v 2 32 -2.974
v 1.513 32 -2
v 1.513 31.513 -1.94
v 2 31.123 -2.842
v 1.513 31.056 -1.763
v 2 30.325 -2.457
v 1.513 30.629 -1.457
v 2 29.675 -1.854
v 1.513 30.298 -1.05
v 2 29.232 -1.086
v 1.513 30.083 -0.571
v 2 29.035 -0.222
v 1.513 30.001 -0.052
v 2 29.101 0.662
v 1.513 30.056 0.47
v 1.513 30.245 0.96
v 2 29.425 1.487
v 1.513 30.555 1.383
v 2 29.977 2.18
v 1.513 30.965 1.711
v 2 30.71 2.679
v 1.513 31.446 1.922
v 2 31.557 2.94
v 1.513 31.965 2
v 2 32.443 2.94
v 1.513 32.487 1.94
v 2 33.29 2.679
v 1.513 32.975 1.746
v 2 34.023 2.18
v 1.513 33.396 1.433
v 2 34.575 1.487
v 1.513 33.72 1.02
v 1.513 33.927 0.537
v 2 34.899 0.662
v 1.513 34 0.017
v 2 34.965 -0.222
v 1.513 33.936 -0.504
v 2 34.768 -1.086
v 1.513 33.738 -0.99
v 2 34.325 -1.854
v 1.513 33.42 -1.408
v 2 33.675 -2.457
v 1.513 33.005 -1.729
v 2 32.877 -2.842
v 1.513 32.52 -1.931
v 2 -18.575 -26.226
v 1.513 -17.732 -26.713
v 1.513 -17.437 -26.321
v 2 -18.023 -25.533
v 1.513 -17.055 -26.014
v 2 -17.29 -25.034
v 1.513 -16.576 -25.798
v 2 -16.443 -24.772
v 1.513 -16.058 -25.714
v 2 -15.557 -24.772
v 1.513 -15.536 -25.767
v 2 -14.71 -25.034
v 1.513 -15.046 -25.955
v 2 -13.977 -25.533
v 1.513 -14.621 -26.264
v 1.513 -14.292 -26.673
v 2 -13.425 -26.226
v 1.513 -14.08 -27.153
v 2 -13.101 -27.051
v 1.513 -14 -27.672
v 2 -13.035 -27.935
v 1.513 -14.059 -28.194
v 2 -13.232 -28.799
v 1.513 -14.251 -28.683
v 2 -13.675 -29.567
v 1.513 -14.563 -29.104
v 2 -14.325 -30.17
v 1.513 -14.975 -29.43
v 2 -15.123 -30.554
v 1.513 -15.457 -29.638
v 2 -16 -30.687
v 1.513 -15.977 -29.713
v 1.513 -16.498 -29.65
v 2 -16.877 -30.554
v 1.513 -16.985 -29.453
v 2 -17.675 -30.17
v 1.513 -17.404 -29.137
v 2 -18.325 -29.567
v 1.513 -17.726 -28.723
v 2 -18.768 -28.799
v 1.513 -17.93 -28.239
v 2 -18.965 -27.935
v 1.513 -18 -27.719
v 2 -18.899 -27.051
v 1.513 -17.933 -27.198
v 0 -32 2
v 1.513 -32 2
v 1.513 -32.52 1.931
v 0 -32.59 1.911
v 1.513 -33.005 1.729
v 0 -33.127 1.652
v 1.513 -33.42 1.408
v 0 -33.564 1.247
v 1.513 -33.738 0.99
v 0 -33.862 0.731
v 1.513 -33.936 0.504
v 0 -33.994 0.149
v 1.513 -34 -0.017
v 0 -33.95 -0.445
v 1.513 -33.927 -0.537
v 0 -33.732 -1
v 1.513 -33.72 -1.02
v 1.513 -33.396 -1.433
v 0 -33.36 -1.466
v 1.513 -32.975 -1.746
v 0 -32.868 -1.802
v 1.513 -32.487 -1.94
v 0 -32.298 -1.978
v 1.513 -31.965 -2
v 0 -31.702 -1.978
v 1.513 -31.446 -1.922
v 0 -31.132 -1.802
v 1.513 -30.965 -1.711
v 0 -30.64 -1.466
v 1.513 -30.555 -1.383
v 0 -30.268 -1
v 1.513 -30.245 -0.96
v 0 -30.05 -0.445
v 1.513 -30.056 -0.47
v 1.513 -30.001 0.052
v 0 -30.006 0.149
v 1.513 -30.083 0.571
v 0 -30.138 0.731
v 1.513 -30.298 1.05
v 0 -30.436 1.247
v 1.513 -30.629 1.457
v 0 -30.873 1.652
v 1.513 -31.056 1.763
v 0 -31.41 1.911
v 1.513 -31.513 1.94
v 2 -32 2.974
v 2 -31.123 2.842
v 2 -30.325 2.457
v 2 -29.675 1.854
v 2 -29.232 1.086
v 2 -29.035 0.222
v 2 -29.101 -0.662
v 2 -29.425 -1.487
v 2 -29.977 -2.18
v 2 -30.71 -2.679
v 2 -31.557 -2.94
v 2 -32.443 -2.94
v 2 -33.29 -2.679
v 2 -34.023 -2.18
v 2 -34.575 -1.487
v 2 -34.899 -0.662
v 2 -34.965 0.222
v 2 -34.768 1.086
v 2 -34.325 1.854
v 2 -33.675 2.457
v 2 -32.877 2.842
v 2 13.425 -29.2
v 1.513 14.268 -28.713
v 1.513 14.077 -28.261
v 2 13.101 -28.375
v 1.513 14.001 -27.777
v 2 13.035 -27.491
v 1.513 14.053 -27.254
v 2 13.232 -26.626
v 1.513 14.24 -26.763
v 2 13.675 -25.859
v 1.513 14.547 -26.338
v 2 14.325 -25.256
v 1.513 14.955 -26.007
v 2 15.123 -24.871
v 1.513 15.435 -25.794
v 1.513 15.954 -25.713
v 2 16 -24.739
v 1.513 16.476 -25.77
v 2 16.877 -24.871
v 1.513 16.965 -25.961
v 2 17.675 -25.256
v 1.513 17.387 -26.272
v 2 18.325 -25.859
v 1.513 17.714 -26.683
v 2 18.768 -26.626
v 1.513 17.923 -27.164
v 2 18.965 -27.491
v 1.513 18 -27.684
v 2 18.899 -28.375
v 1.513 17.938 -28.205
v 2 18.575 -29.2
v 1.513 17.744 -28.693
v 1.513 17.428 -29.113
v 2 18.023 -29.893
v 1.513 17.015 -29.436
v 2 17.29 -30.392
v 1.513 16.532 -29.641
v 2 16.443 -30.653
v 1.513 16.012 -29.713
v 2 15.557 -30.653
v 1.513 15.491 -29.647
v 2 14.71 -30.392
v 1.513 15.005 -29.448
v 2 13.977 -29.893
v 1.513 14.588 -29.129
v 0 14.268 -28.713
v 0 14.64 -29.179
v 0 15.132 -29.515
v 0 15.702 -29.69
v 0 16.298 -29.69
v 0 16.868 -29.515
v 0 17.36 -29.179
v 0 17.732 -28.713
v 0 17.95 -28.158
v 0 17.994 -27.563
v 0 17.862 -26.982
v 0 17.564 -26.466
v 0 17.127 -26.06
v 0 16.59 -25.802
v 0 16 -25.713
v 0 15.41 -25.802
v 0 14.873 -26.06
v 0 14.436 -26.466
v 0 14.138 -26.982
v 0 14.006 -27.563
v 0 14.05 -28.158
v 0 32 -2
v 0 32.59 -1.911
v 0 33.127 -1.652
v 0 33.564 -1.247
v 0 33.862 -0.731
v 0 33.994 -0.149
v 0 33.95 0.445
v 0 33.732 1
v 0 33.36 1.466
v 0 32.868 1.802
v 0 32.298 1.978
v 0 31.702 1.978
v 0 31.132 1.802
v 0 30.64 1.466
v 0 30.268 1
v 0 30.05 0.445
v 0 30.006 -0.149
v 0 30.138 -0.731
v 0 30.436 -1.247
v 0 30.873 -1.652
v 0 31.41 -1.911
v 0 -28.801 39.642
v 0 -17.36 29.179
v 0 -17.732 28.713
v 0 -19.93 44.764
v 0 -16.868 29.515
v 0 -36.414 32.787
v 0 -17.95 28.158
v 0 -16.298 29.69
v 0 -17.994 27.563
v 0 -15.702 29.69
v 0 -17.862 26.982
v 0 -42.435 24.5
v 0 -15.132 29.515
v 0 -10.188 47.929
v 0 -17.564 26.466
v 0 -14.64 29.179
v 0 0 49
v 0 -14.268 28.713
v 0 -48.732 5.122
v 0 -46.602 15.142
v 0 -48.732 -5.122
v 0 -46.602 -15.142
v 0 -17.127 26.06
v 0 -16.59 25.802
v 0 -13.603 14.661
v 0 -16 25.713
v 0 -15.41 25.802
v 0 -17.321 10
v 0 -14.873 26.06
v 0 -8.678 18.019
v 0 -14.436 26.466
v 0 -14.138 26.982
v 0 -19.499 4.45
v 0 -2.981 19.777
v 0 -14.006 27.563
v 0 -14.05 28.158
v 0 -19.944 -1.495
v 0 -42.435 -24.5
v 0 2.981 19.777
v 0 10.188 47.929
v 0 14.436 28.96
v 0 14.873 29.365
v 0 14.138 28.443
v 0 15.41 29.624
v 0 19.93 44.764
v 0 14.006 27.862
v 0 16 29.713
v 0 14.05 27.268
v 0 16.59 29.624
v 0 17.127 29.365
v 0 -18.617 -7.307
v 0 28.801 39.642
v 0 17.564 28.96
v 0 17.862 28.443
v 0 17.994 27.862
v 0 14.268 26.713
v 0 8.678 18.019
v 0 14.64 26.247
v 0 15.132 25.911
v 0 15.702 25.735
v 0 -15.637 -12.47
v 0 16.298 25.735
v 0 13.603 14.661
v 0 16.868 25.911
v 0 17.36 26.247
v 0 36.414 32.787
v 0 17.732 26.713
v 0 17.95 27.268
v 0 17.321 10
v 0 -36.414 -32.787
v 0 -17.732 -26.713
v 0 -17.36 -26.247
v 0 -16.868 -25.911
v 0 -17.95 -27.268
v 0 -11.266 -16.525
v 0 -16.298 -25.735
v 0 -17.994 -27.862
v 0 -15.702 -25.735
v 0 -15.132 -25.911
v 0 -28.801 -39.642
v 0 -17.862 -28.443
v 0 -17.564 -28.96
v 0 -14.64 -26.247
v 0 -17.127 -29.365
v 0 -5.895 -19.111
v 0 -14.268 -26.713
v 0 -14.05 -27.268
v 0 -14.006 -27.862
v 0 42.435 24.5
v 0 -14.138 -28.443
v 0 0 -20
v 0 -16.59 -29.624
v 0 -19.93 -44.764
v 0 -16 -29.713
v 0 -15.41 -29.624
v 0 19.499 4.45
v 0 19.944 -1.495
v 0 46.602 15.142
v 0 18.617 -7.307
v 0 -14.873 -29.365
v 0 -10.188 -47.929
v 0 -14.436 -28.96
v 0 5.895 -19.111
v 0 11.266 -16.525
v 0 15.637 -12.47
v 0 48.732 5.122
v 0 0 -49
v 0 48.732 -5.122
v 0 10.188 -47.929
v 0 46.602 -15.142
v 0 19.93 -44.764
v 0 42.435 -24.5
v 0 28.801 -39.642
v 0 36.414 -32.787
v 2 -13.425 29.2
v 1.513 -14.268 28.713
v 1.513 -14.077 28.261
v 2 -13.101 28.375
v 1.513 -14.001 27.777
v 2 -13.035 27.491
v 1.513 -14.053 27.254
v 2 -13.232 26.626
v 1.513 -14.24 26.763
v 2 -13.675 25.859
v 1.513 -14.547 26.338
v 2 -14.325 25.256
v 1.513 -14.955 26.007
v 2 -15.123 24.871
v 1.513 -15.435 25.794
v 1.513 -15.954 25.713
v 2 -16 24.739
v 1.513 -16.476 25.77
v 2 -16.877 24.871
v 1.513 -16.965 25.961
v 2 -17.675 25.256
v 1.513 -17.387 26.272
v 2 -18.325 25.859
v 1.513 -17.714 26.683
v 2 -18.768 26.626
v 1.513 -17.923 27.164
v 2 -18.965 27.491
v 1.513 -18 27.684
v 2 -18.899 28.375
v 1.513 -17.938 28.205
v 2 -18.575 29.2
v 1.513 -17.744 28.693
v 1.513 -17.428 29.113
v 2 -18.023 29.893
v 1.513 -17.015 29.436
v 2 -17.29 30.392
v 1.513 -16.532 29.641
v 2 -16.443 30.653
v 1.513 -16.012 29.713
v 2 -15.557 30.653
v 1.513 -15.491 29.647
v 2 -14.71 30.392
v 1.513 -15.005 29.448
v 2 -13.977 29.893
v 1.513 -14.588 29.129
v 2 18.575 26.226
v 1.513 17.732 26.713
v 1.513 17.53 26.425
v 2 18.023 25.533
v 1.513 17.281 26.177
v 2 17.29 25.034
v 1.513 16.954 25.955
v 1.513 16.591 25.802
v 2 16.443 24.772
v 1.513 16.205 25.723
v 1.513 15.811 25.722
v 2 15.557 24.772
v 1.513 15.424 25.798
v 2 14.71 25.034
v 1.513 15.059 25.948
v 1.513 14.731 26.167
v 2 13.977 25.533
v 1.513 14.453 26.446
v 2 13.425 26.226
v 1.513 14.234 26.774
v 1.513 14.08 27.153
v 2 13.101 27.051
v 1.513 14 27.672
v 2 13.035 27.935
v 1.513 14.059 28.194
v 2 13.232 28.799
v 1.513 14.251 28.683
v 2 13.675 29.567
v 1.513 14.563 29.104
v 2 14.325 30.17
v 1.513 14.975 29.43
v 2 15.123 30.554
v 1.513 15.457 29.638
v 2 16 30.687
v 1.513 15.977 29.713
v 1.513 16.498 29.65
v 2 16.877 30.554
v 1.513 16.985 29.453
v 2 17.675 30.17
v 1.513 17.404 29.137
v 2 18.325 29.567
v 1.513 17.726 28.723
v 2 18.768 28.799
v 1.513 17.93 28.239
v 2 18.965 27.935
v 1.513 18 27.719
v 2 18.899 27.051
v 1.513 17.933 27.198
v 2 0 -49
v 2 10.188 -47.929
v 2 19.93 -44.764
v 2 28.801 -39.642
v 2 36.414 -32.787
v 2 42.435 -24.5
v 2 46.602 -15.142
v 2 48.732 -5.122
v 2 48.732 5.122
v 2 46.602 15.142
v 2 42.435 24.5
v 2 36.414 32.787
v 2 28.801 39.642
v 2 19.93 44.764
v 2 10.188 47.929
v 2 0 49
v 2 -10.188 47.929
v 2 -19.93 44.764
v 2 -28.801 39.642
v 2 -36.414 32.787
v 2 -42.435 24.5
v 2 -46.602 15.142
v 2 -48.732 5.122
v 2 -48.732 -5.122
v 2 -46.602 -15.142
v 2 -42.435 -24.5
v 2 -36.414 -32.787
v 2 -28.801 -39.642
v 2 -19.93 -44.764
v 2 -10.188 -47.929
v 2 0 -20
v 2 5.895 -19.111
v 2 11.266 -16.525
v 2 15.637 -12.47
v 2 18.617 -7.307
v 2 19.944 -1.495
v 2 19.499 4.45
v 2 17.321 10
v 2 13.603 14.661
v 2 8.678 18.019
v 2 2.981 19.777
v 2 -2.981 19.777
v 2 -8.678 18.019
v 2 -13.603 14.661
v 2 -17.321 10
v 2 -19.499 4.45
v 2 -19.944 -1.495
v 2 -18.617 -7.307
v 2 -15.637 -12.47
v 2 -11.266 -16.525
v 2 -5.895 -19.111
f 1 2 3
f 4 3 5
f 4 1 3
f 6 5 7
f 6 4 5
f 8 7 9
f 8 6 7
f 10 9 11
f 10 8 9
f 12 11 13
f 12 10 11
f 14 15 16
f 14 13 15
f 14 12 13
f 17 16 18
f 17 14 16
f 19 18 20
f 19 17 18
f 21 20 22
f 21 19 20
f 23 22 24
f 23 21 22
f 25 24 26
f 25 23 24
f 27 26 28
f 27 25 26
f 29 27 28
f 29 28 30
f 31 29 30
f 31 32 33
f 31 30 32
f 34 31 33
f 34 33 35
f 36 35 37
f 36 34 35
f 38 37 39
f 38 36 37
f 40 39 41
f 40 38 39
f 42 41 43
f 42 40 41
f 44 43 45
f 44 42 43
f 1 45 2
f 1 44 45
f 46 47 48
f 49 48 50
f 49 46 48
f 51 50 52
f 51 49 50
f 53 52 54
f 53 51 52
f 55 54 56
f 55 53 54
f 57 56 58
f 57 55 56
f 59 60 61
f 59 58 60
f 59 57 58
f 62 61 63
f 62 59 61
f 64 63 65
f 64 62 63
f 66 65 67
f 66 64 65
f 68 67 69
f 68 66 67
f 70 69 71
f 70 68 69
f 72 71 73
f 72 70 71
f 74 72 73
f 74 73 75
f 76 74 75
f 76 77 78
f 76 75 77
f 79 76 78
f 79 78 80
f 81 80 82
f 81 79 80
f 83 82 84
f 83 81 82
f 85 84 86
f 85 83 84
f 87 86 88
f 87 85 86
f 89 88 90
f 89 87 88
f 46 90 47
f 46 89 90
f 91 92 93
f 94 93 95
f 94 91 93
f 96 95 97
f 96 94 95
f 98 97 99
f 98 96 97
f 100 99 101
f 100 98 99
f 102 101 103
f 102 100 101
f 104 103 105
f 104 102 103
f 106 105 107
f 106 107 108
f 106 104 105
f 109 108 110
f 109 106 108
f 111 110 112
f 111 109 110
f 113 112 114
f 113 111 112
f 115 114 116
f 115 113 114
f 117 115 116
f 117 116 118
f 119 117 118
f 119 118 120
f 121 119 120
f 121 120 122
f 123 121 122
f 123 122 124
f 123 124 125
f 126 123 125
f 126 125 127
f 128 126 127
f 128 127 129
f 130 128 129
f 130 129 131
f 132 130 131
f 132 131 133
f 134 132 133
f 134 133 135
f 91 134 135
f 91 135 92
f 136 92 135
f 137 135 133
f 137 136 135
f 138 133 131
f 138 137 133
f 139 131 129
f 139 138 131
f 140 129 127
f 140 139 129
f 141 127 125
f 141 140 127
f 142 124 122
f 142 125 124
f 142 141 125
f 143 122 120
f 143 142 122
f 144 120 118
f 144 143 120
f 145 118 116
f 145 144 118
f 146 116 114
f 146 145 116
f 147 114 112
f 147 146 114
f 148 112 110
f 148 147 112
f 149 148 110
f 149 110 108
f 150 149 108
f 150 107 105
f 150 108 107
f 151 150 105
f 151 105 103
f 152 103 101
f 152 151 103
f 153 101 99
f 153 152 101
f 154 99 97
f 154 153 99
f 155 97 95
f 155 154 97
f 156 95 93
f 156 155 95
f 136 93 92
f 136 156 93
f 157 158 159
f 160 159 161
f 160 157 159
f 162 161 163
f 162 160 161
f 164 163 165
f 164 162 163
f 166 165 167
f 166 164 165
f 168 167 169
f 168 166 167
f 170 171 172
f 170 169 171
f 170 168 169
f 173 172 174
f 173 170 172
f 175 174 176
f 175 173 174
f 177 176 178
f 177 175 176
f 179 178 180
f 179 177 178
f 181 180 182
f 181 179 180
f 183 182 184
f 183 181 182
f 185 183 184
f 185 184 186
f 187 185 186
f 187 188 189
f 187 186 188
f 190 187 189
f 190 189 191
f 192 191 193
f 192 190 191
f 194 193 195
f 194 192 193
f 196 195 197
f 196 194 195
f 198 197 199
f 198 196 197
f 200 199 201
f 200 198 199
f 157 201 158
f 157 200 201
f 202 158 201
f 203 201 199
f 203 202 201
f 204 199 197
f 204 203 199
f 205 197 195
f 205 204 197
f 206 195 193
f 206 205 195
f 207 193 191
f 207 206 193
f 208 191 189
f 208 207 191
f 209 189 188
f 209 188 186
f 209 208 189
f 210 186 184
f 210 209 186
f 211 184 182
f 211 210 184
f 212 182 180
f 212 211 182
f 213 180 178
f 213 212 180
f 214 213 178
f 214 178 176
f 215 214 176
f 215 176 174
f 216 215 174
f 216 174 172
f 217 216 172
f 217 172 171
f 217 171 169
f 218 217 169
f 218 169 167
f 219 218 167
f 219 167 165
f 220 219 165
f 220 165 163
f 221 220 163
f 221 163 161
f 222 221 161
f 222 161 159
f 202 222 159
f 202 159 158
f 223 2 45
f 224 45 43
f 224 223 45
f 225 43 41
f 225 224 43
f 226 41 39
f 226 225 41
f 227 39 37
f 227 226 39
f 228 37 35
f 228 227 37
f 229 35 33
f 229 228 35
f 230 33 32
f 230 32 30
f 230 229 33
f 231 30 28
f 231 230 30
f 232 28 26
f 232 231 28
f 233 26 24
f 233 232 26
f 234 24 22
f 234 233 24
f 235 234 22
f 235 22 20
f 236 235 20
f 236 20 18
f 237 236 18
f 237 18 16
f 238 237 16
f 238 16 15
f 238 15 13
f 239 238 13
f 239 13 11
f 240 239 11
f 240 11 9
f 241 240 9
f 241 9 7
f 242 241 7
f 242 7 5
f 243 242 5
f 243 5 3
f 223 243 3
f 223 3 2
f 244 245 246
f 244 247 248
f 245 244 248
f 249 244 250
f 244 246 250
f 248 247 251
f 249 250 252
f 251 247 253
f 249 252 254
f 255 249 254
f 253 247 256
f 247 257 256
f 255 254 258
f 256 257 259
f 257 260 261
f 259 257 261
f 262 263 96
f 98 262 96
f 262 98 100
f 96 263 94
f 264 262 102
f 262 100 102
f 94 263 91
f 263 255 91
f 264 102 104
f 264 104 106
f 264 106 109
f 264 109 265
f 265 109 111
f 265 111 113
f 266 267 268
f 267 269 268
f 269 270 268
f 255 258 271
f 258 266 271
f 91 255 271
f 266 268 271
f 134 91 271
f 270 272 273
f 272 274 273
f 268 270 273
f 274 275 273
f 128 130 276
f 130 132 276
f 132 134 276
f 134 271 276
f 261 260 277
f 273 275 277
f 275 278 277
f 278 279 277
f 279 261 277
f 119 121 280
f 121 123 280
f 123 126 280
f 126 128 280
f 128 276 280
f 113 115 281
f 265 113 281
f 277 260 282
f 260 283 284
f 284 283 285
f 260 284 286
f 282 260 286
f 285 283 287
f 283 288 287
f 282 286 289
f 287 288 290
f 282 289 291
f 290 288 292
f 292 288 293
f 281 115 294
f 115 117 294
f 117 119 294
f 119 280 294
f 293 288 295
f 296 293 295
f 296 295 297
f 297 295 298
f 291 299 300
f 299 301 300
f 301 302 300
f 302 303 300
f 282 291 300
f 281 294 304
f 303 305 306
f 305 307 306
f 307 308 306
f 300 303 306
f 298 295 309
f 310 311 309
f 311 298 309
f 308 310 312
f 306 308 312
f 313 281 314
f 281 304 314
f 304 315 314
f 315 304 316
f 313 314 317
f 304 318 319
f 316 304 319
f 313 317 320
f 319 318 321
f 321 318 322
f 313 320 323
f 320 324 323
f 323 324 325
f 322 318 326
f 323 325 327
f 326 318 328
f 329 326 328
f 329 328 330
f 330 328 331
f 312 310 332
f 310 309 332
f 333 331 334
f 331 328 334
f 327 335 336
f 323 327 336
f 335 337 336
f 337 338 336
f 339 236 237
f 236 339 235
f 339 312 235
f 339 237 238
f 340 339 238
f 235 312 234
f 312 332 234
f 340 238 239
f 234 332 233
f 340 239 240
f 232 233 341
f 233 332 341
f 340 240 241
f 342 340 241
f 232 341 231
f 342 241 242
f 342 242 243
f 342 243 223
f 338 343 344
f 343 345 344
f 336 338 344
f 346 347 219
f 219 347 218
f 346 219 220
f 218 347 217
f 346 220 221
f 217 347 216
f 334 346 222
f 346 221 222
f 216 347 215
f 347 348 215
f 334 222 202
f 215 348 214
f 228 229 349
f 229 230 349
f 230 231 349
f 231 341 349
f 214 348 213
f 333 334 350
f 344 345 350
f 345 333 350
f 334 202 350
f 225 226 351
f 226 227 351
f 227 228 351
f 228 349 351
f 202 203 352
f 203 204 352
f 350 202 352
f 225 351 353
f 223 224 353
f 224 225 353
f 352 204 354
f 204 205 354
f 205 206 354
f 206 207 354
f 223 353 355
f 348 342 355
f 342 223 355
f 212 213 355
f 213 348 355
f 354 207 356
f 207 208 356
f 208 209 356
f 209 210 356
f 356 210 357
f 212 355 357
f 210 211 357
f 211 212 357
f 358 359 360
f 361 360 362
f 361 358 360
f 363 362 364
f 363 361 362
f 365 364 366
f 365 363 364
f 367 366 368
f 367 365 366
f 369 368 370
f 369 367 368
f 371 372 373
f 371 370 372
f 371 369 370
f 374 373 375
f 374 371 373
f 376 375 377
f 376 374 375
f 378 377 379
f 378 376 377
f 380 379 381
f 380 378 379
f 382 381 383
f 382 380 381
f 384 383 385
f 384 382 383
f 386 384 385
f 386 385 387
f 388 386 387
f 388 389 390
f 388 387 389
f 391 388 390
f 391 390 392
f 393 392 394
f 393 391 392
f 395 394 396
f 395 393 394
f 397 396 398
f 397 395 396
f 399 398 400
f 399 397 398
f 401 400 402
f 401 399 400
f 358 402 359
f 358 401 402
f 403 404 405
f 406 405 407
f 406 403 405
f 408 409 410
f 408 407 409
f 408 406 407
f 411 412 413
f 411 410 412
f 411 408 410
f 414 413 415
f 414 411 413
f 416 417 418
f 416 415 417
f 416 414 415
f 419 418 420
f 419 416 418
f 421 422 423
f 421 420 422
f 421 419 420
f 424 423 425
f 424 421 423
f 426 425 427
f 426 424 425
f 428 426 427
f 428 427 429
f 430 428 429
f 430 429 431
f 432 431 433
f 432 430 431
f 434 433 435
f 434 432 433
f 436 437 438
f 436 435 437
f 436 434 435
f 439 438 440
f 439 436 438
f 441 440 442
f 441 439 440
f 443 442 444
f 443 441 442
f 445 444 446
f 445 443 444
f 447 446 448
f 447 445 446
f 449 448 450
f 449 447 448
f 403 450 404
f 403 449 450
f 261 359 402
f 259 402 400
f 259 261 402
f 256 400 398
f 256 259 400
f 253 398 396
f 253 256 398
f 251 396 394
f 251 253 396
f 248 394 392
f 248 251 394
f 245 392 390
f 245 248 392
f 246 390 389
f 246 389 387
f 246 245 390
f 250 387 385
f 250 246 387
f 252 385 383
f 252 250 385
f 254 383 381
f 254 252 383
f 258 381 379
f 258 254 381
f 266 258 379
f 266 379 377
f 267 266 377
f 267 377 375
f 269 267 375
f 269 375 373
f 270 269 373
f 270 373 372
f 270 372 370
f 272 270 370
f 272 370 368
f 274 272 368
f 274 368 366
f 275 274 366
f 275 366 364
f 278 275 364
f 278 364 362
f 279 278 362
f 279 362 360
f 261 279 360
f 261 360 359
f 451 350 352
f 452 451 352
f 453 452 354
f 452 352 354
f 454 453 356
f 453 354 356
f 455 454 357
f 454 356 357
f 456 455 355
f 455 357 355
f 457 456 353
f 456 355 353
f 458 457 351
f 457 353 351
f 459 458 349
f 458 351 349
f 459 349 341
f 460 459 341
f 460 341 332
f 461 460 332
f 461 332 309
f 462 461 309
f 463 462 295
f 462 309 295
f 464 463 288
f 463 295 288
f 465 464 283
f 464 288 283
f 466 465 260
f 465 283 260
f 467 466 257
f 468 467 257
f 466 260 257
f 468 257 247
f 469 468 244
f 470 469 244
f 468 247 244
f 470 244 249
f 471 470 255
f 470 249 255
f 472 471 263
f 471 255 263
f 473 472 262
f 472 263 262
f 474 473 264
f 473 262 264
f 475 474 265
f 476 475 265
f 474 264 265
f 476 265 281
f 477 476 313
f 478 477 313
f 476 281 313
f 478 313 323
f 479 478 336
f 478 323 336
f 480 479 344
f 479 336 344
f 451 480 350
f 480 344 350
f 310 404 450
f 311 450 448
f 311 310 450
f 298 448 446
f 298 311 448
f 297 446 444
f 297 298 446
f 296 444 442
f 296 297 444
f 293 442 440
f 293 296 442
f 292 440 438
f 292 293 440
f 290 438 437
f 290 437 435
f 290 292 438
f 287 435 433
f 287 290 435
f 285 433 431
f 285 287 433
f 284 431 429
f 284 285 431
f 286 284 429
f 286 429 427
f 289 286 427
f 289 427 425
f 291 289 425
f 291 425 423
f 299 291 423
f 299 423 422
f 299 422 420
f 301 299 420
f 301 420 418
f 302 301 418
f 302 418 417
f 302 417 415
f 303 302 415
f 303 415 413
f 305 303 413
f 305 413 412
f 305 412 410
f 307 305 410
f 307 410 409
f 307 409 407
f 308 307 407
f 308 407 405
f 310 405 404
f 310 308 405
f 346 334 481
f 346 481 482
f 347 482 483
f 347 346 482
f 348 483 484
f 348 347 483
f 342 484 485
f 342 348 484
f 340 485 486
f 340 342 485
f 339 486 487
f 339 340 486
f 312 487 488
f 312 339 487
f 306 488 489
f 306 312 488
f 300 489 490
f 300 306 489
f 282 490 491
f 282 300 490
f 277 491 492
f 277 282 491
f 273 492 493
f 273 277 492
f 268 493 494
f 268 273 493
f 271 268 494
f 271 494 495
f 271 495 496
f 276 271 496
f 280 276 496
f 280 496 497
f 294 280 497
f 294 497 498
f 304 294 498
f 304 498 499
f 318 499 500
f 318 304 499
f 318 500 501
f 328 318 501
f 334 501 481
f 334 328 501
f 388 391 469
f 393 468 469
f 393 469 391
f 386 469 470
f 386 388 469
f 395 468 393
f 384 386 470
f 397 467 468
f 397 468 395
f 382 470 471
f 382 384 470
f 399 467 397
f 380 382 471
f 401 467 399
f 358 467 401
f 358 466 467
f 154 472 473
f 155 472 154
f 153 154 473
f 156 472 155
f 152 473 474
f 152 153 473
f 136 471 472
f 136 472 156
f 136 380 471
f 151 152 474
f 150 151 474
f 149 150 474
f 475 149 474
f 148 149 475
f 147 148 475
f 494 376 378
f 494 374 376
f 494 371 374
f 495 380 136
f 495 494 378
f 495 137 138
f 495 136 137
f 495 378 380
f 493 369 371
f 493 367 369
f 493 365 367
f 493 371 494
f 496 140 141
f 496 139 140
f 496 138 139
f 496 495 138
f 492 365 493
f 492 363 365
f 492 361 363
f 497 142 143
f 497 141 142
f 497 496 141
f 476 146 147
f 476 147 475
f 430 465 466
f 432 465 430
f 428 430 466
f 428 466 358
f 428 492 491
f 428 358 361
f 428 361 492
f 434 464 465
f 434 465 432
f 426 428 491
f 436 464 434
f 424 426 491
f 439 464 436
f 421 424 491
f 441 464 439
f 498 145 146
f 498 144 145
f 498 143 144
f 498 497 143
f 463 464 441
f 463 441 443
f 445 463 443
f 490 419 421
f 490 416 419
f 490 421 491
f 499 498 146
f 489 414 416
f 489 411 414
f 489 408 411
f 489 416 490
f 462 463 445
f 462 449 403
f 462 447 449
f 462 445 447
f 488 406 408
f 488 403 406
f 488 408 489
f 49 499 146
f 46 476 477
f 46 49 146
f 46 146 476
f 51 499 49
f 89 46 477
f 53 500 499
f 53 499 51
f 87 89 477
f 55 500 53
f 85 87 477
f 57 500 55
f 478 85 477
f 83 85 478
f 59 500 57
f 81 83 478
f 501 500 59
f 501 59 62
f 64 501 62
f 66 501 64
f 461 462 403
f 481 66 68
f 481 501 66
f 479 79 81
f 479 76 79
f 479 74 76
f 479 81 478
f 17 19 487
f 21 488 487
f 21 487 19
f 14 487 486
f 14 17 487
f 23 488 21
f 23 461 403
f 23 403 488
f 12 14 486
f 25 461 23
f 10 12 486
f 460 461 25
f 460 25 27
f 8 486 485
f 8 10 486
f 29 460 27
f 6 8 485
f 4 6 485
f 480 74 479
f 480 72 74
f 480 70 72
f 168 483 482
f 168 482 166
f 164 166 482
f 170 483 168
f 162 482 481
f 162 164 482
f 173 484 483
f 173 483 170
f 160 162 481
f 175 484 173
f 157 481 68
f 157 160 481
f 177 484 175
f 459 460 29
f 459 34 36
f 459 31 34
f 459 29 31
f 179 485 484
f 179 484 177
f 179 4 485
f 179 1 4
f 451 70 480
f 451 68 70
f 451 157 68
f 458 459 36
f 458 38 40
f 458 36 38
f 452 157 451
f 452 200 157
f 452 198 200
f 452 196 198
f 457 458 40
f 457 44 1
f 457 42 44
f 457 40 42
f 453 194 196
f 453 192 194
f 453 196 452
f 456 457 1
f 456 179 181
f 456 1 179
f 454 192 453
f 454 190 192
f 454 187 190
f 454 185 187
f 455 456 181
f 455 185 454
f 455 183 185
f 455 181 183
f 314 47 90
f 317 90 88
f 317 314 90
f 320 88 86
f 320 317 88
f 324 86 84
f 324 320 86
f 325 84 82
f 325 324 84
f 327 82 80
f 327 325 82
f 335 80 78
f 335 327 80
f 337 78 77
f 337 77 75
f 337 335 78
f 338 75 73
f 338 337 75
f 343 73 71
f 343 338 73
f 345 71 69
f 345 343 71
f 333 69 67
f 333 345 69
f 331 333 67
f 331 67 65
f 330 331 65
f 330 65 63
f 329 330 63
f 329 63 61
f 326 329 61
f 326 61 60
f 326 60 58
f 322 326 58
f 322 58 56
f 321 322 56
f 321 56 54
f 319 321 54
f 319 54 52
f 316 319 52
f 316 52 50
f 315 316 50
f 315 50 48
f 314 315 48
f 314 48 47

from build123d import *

# Parameters (mm, degrees)
SKETCH1_R           = 49
SKETCH1_R_2         = 20
BOSS_EXTRUDE1_DEPTH = 2
SKETCH1_3_R         = 2
CUT_EXTRUDE2_DEPTH  = 0.5
SKETCH1_4_R         = 2
CUT_EXTRUDE3_DEPTH  = 70.32532005
CIRPATTERN1_COUNT   = 6
CIRPATTERN2_COUNT   = 6


with BuildPart() as part:
    # Sketch1 → Boss-Extrude1 (new body)
    with BuildSketch(Plane.YZ):
        Circle(SKETCH1_R)
        Circle(SKETCH1_R_2, mode=Mode.SUBTRACT)
    extrude(amount=BOSS_EXTRUDE1_DEPTH)

    # Sketch1<3> → Cut-Extrude2 (cut)
    with BuildSketch(Plane.YZ):
        with Locations((32, 0)):
            Circle(SKETCH1_3_R)
    cut_extrude2 = extrude(amount=CUT_EXTRUDE2_DEPTH, mode=Mode.SUBTRACT)

    # Sketch1<4> → Cut-Extrude3 (cut, through all)
    with BuildSketch(Plane.YZ):
        with Locations((32, 0)):
            Circle(SKETCH1_4_R)
    cut_extrude3 = extrude(amount=CUT_EXTRUDE3_DEPTH, mode=Mode.SUBTRACT)

    # CirPattern1: Cut-Extrude2, Cut-Extrude3 ×6 about axis
    cirpattern1_axis = Axis((0, 0, 0), (1, 0, 0))
    add([cut_extrude2.rotate(cirpattern1_axis, i * 360 / CIRPATTERN1_COUNT) for i in range(1, CIRPATTERN1_COUNT)], mode=Mode.SUBTRACT)
    add([cut_extrude3.rotate(cirpattern1_axis, i * 360 / CIRPATTERN1_COUNT) for i in range(1, CIRPATTERN1_COUNT)], mode=Mode.SUBTRACT)

    # Sketch3 → Cut-Revolve1 (revolve, cut)
    with BuildSketch(Plane(origin=(0, 16, 0), x_dir=(-1, 0, 0), z_dir=(0, 1, 0))):
        Polygon((-2.49931716, 31.685808566), (-2.49931716, 27.712812921), (-1.5, 27.712812921), (-1.5, 29.685860989), align=None)
    cut_revolve1 = revolve(axis=Axis((15.134577625, 16, 27.712812921), (-1, 0, 0)), mode=Mode.SUBTRACT)

    # CirPattern2: Cut-Revolve1 ×6 about axis
    cirpattern2_axis = Axis((2, 0, 0), (1, 0, 0))
    for i in range(1, CIRPATTERN2_COUNT):
        add(cut_revolve1.rotate(cirpattern2_axis, i * 360 / CIRPATTERN2_COUNT), mode=Mode.SUBTRACT)


solid = part.part
